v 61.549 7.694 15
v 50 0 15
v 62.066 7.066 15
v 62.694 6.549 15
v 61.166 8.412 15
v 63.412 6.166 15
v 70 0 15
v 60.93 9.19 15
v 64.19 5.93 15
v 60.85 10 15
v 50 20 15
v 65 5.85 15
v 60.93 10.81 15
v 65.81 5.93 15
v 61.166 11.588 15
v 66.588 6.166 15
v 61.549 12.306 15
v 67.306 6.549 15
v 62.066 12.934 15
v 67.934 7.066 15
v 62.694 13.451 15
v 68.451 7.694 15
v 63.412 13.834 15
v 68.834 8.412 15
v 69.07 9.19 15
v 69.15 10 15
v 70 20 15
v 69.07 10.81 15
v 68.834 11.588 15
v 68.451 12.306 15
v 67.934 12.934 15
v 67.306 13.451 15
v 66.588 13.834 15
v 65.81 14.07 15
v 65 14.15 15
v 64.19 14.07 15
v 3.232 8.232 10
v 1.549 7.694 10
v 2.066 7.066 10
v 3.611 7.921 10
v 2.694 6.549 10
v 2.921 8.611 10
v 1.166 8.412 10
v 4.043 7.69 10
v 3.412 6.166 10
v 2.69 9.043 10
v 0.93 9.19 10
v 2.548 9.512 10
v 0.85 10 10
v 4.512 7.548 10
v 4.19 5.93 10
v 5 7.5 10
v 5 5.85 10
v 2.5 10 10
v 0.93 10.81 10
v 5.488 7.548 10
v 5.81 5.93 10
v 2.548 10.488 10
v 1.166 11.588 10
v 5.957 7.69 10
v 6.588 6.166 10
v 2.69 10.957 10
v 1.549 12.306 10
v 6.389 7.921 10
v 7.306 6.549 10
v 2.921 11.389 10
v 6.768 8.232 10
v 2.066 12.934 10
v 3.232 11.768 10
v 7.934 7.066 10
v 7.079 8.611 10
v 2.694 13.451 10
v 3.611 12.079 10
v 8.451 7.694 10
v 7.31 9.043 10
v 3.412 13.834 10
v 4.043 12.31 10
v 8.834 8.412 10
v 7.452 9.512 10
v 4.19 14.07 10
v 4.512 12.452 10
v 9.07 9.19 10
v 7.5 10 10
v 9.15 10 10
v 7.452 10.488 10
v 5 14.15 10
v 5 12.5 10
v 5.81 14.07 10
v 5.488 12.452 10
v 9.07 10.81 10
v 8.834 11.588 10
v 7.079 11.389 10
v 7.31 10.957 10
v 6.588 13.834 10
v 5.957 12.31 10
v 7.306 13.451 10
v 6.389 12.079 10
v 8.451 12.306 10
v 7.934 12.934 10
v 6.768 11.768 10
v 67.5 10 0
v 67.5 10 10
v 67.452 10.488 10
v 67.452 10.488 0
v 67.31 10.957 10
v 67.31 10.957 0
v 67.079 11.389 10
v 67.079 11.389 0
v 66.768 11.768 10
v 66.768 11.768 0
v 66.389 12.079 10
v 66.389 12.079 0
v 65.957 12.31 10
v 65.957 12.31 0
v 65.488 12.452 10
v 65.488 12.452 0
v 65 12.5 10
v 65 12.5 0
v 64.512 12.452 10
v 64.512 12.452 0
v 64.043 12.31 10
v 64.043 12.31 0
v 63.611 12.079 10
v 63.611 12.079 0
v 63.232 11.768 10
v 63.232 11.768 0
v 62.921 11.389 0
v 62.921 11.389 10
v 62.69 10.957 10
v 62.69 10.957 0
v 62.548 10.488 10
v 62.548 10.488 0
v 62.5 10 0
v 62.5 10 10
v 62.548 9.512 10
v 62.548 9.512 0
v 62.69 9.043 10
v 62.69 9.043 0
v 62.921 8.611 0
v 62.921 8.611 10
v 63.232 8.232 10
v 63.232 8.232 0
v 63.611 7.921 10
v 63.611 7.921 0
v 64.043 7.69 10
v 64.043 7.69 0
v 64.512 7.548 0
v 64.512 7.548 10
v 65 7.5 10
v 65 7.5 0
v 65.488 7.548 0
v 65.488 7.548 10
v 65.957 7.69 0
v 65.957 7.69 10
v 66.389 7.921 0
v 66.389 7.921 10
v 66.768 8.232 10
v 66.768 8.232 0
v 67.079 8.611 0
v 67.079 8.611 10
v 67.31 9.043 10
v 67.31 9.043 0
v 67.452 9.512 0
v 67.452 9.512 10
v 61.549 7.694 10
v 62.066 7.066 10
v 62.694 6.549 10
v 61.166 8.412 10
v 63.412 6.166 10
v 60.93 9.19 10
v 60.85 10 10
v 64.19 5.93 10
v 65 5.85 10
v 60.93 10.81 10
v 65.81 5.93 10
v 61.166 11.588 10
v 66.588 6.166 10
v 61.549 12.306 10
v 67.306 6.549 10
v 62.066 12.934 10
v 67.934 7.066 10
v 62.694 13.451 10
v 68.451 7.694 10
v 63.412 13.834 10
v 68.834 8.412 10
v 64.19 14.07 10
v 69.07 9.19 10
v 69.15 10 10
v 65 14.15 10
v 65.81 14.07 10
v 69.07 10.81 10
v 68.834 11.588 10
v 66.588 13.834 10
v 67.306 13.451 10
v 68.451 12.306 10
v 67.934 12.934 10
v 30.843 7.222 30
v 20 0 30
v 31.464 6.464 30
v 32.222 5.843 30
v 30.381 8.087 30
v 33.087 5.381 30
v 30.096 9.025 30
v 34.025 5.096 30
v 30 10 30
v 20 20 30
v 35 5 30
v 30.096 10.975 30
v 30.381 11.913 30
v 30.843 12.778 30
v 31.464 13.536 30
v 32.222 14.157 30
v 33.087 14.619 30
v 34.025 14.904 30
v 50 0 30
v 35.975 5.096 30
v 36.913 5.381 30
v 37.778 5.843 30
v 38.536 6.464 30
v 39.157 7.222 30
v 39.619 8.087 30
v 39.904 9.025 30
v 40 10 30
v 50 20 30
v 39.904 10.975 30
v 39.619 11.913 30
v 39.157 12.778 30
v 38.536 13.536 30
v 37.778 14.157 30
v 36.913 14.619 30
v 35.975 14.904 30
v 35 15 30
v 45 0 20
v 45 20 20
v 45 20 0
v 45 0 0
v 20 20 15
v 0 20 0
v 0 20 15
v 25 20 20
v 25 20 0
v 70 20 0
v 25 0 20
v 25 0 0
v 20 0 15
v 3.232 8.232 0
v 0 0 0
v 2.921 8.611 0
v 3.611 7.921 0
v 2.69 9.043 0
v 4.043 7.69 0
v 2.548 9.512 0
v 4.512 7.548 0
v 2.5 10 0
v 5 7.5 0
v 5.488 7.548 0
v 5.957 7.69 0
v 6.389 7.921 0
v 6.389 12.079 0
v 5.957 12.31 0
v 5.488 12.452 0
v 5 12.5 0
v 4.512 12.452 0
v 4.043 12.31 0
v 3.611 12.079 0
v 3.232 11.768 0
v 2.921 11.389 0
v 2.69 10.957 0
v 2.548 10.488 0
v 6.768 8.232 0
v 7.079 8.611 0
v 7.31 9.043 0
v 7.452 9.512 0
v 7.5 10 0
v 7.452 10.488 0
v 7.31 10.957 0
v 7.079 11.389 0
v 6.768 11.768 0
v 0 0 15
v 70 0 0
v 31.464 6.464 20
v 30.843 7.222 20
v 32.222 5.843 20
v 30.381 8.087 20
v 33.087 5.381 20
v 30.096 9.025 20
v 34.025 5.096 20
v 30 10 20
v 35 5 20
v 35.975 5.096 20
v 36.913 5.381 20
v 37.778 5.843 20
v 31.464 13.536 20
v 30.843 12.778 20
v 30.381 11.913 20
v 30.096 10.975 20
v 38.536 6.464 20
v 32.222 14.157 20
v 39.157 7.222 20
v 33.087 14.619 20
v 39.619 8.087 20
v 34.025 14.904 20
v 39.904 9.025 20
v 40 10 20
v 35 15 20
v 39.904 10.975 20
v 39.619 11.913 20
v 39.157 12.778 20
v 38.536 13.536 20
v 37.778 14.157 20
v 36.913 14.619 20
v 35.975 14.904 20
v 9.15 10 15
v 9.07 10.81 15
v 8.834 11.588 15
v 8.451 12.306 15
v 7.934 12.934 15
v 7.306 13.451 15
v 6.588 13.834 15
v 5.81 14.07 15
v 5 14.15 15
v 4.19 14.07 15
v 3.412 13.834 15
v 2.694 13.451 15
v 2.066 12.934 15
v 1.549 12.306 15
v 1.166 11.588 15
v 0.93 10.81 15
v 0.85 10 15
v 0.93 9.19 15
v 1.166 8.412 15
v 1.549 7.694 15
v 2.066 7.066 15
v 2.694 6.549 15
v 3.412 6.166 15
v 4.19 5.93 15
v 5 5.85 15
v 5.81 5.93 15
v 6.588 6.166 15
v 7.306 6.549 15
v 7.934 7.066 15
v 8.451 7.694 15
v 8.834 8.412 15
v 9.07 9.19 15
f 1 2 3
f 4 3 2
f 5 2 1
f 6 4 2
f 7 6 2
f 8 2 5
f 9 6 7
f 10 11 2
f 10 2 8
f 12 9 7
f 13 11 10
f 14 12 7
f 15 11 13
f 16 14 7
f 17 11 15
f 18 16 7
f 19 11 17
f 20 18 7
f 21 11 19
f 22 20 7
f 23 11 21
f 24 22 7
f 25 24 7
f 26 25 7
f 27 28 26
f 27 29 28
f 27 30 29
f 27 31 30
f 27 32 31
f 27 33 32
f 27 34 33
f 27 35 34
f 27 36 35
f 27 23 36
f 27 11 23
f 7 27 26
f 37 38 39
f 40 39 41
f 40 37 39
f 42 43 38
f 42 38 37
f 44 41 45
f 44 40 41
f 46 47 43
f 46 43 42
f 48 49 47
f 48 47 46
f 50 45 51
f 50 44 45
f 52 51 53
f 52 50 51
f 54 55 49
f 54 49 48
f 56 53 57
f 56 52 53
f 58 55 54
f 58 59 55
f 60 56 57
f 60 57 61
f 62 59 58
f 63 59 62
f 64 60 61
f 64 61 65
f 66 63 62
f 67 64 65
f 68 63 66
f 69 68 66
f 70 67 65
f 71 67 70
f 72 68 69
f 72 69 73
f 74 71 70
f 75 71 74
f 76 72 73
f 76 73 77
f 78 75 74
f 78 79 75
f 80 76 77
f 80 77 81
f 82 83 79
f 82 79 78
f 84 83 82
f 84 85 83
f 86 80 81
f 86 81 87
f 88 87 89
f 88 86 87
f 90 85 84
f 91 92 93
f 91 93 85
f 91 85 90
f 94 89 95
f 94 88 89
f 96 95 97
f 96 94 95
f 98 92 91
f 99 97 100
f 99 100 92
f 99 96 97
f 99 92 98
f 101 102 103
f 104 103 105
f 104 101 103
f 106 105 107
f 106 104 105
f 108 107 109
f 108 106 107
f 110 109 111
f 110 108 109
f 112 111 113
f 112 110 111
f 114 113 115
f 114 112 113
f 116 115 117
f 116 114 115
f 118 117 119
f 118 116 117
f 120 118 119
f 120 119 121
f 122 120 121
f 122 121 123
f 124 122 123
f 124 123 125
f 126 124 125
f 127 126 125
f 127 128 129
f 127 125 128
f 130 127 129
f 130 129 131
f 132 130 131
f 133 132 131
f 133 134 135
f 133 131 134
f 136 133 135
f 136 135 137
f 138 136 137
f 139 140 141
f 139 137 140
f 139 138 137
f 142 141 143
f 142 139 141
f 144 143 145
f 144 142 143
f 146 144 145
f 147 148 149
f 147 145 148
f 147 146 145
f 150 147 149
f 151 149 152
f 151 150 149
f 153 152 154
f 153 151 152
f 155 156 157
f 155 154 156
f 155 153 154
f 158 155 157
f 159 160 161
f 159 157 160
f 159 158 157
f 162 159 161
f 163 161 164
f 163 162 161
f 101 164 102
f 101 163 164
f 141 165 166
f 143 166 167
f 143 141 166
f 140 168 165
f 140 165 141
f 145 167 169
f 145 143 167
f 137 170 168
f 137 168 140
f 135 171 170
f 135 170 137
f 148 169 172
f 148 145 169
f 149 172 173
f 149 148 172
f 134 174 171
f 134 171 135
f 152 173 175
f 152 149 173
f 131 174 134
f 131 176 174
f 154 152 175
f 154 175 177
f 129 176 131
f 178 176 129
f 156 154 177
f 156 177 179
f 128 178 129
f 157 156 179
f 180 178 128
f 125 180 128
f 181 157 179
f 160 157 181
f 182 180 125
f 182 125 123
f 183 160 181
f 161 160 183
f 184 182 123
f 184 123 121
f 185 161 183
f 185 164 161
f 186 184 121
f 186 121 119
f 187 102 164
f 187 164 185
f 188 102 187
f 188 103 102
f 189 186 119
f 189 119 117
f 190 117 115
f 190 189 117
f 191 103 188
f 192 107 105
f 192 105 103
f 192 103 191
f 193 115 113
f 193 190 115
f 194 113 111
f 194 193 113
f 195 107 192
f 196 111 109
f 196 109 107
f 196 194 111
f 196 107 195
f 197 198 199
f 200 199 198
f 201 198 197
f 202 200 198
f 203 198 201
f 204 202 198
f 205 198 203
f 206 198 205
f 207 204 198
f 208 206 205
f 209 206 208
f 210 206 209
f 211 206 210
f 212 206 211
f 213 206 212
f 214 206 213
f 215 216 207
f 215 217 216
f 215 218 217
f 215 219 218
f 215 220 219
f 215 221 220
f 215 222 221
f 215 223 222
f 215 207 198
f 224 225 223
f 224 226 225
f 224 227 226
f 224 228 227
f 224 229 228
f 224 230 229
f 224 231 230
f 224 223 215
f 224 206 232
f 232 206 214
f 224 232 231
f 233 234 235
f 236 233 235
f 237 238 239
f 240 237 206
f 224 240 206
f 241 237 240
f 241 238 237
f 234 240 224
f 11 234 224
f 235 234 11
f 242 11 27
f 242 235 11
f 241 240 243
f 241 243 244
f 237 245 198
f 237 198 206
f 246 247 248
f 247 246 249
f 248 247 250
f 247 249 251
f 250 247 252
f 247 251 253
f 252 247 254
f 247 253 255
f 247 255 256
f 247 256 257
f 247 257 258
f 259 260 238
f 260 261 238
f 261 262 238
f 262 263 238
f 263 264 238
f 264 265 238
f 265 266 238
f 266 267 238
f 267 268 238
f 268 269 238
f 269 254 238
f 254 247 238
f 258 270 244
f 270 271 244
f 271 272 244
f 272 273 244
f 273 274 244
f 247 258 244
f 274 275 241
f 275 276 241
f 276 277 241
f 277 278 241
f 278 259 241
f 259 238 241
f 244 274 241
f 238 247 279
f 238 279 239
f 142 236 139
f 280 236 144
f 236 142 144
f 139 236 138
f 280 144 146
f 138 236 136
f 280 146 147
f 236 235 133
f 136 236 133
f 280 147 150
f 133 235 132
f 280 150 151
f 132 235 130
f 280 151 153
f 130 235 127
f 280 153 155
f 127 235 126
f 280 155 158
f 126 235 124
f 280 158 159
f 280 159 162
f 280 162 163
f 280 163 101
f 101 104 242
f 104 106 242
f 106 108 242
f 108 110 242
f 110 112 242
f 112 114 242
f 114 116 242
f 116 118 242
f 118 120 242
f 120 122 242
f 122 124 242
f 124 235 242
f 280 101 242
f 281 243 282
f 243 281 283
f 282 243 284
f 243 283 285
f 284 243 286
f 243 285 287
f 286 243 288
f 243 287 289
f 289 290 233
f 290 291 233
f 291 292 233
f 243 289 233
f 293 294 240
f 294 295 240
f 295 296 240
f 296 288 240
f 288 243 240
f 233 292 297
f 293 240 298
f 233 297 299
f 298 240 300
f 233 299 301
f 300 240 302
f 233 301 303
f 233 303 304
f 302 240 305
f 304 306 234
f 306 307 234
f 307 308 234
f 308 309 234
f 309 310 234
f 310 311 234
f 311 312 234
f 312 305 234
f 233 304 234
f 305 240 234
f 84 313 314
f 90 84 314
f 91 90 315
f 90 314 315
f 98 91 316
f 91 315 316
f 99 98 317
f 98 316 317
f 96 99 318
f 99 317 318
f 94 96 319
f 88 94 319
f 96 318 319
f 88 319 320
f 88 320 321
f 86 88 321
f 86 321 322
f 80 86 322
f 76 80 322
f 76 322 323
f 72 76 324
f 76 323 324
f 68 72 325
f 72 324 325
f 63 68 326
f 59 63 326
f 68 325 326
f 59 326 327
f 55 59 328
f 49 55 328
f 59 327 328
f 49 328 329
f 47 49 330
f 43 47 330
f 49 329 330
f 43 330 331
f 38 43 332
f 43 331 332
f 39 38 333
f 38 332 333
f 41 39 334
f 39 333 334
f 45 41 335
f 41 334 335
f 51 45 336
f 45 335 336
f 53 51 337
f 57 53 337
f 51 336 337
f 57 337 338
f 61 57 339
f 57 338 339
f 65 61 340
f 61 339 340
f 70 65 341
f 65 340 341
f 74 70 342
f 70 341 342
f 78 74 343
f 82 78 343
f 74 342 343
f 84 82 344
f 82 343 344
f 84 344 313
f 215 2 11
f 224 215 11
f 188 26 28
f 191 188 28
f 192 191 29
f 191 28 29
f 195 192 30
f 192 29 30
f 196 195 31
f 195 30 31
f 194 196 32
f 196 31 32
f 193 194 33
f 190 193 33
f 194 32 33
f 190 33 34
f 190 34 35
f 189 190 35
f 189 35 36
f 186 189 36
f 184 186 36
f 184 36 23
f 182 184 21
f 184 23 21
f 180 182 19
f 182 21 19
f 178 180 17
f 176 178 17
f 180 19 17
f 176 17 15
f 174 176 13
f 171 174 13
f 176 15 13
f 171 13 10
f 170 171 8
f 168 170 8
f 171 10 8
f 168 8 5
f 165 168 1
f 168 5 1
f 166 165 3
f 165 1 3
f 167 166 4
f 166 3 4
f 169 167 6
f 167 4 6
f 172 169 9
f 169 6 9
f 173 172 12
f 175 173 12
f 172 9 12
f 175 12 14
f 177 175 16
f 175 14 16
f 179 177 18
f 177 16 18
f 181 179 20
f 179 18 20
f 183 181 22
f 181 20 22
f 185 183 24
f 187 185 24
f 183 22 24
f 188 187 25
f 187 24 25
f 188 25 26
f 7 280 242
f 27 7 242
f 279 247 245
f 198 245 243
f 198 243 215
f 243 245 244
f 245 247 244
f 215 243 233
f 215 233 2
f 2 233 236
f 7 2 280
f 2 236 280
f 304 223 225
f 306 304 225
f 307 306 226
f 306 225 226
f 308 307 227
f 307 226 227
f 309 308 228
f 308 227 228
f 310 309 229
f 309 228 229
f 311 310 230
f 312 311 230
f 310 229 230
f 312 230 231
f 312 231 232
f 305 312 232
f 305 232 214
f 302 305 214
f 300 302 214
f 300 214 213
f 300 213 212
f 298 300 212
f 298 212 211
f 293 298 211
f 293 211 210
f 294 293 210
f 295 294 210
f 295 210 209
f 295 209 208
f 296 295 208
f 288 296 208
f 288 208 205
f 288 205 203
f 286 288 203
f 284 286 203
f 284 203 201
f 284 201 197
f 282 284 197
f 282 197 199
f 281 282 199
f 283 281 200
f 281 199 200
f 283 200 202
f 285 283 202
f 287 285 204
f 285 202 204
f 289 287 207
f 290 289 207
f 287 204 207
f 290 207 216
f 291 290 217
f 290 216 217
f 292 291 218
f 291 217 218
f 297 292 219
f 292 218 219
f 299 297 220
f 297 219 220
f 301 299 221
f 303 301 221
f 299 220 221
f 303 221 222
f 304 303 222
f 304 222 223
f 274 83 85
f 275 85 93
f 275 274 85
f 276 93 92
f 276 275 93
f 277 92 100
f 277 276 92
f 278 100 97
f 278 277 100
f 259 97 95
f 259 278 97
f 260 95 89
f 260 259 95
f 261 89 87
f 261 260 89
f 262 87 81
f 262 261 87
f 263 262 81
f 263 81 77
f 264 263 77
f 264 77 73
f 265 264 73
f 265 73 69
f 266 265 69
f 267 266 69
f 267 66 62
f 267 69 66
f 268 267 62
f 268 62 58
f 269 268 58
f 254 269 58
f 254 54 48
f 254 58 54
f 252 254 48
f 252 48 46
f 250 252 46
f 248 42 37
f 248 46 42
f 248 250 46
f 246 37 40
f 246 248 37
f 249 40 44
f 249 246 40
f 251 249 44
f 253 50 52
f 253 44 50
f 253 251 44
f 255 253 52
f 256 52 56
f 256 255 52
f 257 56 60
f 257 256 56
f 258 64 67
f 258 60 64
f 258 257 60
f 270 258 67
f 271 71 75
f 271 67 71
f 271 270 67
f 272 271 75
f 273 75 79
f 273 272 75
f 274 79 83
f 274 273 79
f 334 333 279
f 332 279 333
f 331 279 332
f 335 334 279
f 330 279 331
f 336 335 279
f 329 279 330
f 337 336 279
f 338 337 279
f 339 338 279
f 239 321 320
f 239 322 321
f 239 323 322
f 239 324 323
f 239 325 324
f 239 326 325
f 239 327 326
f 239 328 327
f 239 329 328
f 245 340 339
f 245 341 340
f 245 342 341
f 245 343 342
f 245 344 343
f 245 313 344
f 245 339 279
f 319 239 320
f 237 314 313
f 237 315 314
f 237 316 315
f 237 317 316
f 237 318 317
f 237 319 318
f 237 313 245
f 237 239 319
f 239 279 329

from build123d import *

# Parameters (mm, degrees)
SKETCH1_W           = 70
SKETCH1_H           = 20
SKETCH1_R           = 2.5
BOSS_EXTRUDE1_DEPTH = 15
SKETCH2_W           = 30
SKETCH2_H           = 20
BOSS_EXTRUDE2_DEPTH = 15
SKETCH4_W           = 20
SKETCH4_H           = 20
CUT_EXTRUDE1_DEPTH  = 79.74007874
SKETCH5_R           = 5
CUT_EXTRUDE2_DEPTH  = 79.74007874
SKETCH6_R           = 4.15
CUT_EXTRUDE3_DEPTH  = 5
SKETCH7_R           = 4.15
CUT_EXTRUDE4_DEPTH  = 5


with BuildPart() as part:
    # Sketch1 → Boss-Extrude1 (new body)
    with BuildSketch(Plane.XY):
        with Locations((35, 10)):
            Rectangle(SKETCH1_W, SKETCH1_H)
        with Locations((65, 10)):
            Circle(SKETCH1_R, mode=Mode.SUBTRACT)
        with Locations((5, 10)):
            Circle(SKETCH1_R, mode=Mode.SUBTRACT)
    extrude(amount=BOSS_EXTRUDE1_DEPTH)

    # Sketch2 → Boss-Extrude2 (add)
    with BuildSketch(Plane.XY.offset(15)):
        with Locations((35, 10)):
            Rectangle(SKETCH2_W, SKETCH2_H)
    extrude(amount=BOSS_EXTRUDE2_DEPTH)

    # Sketch4 → Cut-Extrude1 (cut, through all)
    with BuildSketch(Plane(origin=(0, 20, 0), x_dir=(1, 0, 0), z_dir=(0, 1, 0))):
        with Locations((35, -10)):
            Rectangle(SKETCH4_W, SKETCH4_H)
    extrude(amount=-CUT_EXTRUDE1_DEPTH, mode=Mode.SUBTRACT)

    # Sketch5 → Cut-Extrude2 (cut, through all)
    with BuildSketch(Plane.XY.offset(30)):
        with Locations((35, 10)):
            Circle(SKETCH5_R)
    extrude(amount=-CUT_EXTRUDE2_DEPTH, mode=Mode.SUBTRACT)

    # Sketch6 → Cut-Extrude3 (cut)
    with BuildSketch(Plane.XY.offset(15)):
        with Locations((5, 10)):
            Circle(SKETCH6_R)
    extrude(amount=-CUT_EXTRUDE3_DEPTH, mode=Mode.SUBTRACT)

    # Sketch7 → Cut-Extrude4 (cut)
    with BuildSketch(Plane.XY.offset(15)):
        with Locations((65, 10)):
            Circle(SKETCH7_R)
    extrude(amount=-CUT_EXTRUDE4_DEPTH, mode=Mode.SUBTRACT)


solid = part.part
